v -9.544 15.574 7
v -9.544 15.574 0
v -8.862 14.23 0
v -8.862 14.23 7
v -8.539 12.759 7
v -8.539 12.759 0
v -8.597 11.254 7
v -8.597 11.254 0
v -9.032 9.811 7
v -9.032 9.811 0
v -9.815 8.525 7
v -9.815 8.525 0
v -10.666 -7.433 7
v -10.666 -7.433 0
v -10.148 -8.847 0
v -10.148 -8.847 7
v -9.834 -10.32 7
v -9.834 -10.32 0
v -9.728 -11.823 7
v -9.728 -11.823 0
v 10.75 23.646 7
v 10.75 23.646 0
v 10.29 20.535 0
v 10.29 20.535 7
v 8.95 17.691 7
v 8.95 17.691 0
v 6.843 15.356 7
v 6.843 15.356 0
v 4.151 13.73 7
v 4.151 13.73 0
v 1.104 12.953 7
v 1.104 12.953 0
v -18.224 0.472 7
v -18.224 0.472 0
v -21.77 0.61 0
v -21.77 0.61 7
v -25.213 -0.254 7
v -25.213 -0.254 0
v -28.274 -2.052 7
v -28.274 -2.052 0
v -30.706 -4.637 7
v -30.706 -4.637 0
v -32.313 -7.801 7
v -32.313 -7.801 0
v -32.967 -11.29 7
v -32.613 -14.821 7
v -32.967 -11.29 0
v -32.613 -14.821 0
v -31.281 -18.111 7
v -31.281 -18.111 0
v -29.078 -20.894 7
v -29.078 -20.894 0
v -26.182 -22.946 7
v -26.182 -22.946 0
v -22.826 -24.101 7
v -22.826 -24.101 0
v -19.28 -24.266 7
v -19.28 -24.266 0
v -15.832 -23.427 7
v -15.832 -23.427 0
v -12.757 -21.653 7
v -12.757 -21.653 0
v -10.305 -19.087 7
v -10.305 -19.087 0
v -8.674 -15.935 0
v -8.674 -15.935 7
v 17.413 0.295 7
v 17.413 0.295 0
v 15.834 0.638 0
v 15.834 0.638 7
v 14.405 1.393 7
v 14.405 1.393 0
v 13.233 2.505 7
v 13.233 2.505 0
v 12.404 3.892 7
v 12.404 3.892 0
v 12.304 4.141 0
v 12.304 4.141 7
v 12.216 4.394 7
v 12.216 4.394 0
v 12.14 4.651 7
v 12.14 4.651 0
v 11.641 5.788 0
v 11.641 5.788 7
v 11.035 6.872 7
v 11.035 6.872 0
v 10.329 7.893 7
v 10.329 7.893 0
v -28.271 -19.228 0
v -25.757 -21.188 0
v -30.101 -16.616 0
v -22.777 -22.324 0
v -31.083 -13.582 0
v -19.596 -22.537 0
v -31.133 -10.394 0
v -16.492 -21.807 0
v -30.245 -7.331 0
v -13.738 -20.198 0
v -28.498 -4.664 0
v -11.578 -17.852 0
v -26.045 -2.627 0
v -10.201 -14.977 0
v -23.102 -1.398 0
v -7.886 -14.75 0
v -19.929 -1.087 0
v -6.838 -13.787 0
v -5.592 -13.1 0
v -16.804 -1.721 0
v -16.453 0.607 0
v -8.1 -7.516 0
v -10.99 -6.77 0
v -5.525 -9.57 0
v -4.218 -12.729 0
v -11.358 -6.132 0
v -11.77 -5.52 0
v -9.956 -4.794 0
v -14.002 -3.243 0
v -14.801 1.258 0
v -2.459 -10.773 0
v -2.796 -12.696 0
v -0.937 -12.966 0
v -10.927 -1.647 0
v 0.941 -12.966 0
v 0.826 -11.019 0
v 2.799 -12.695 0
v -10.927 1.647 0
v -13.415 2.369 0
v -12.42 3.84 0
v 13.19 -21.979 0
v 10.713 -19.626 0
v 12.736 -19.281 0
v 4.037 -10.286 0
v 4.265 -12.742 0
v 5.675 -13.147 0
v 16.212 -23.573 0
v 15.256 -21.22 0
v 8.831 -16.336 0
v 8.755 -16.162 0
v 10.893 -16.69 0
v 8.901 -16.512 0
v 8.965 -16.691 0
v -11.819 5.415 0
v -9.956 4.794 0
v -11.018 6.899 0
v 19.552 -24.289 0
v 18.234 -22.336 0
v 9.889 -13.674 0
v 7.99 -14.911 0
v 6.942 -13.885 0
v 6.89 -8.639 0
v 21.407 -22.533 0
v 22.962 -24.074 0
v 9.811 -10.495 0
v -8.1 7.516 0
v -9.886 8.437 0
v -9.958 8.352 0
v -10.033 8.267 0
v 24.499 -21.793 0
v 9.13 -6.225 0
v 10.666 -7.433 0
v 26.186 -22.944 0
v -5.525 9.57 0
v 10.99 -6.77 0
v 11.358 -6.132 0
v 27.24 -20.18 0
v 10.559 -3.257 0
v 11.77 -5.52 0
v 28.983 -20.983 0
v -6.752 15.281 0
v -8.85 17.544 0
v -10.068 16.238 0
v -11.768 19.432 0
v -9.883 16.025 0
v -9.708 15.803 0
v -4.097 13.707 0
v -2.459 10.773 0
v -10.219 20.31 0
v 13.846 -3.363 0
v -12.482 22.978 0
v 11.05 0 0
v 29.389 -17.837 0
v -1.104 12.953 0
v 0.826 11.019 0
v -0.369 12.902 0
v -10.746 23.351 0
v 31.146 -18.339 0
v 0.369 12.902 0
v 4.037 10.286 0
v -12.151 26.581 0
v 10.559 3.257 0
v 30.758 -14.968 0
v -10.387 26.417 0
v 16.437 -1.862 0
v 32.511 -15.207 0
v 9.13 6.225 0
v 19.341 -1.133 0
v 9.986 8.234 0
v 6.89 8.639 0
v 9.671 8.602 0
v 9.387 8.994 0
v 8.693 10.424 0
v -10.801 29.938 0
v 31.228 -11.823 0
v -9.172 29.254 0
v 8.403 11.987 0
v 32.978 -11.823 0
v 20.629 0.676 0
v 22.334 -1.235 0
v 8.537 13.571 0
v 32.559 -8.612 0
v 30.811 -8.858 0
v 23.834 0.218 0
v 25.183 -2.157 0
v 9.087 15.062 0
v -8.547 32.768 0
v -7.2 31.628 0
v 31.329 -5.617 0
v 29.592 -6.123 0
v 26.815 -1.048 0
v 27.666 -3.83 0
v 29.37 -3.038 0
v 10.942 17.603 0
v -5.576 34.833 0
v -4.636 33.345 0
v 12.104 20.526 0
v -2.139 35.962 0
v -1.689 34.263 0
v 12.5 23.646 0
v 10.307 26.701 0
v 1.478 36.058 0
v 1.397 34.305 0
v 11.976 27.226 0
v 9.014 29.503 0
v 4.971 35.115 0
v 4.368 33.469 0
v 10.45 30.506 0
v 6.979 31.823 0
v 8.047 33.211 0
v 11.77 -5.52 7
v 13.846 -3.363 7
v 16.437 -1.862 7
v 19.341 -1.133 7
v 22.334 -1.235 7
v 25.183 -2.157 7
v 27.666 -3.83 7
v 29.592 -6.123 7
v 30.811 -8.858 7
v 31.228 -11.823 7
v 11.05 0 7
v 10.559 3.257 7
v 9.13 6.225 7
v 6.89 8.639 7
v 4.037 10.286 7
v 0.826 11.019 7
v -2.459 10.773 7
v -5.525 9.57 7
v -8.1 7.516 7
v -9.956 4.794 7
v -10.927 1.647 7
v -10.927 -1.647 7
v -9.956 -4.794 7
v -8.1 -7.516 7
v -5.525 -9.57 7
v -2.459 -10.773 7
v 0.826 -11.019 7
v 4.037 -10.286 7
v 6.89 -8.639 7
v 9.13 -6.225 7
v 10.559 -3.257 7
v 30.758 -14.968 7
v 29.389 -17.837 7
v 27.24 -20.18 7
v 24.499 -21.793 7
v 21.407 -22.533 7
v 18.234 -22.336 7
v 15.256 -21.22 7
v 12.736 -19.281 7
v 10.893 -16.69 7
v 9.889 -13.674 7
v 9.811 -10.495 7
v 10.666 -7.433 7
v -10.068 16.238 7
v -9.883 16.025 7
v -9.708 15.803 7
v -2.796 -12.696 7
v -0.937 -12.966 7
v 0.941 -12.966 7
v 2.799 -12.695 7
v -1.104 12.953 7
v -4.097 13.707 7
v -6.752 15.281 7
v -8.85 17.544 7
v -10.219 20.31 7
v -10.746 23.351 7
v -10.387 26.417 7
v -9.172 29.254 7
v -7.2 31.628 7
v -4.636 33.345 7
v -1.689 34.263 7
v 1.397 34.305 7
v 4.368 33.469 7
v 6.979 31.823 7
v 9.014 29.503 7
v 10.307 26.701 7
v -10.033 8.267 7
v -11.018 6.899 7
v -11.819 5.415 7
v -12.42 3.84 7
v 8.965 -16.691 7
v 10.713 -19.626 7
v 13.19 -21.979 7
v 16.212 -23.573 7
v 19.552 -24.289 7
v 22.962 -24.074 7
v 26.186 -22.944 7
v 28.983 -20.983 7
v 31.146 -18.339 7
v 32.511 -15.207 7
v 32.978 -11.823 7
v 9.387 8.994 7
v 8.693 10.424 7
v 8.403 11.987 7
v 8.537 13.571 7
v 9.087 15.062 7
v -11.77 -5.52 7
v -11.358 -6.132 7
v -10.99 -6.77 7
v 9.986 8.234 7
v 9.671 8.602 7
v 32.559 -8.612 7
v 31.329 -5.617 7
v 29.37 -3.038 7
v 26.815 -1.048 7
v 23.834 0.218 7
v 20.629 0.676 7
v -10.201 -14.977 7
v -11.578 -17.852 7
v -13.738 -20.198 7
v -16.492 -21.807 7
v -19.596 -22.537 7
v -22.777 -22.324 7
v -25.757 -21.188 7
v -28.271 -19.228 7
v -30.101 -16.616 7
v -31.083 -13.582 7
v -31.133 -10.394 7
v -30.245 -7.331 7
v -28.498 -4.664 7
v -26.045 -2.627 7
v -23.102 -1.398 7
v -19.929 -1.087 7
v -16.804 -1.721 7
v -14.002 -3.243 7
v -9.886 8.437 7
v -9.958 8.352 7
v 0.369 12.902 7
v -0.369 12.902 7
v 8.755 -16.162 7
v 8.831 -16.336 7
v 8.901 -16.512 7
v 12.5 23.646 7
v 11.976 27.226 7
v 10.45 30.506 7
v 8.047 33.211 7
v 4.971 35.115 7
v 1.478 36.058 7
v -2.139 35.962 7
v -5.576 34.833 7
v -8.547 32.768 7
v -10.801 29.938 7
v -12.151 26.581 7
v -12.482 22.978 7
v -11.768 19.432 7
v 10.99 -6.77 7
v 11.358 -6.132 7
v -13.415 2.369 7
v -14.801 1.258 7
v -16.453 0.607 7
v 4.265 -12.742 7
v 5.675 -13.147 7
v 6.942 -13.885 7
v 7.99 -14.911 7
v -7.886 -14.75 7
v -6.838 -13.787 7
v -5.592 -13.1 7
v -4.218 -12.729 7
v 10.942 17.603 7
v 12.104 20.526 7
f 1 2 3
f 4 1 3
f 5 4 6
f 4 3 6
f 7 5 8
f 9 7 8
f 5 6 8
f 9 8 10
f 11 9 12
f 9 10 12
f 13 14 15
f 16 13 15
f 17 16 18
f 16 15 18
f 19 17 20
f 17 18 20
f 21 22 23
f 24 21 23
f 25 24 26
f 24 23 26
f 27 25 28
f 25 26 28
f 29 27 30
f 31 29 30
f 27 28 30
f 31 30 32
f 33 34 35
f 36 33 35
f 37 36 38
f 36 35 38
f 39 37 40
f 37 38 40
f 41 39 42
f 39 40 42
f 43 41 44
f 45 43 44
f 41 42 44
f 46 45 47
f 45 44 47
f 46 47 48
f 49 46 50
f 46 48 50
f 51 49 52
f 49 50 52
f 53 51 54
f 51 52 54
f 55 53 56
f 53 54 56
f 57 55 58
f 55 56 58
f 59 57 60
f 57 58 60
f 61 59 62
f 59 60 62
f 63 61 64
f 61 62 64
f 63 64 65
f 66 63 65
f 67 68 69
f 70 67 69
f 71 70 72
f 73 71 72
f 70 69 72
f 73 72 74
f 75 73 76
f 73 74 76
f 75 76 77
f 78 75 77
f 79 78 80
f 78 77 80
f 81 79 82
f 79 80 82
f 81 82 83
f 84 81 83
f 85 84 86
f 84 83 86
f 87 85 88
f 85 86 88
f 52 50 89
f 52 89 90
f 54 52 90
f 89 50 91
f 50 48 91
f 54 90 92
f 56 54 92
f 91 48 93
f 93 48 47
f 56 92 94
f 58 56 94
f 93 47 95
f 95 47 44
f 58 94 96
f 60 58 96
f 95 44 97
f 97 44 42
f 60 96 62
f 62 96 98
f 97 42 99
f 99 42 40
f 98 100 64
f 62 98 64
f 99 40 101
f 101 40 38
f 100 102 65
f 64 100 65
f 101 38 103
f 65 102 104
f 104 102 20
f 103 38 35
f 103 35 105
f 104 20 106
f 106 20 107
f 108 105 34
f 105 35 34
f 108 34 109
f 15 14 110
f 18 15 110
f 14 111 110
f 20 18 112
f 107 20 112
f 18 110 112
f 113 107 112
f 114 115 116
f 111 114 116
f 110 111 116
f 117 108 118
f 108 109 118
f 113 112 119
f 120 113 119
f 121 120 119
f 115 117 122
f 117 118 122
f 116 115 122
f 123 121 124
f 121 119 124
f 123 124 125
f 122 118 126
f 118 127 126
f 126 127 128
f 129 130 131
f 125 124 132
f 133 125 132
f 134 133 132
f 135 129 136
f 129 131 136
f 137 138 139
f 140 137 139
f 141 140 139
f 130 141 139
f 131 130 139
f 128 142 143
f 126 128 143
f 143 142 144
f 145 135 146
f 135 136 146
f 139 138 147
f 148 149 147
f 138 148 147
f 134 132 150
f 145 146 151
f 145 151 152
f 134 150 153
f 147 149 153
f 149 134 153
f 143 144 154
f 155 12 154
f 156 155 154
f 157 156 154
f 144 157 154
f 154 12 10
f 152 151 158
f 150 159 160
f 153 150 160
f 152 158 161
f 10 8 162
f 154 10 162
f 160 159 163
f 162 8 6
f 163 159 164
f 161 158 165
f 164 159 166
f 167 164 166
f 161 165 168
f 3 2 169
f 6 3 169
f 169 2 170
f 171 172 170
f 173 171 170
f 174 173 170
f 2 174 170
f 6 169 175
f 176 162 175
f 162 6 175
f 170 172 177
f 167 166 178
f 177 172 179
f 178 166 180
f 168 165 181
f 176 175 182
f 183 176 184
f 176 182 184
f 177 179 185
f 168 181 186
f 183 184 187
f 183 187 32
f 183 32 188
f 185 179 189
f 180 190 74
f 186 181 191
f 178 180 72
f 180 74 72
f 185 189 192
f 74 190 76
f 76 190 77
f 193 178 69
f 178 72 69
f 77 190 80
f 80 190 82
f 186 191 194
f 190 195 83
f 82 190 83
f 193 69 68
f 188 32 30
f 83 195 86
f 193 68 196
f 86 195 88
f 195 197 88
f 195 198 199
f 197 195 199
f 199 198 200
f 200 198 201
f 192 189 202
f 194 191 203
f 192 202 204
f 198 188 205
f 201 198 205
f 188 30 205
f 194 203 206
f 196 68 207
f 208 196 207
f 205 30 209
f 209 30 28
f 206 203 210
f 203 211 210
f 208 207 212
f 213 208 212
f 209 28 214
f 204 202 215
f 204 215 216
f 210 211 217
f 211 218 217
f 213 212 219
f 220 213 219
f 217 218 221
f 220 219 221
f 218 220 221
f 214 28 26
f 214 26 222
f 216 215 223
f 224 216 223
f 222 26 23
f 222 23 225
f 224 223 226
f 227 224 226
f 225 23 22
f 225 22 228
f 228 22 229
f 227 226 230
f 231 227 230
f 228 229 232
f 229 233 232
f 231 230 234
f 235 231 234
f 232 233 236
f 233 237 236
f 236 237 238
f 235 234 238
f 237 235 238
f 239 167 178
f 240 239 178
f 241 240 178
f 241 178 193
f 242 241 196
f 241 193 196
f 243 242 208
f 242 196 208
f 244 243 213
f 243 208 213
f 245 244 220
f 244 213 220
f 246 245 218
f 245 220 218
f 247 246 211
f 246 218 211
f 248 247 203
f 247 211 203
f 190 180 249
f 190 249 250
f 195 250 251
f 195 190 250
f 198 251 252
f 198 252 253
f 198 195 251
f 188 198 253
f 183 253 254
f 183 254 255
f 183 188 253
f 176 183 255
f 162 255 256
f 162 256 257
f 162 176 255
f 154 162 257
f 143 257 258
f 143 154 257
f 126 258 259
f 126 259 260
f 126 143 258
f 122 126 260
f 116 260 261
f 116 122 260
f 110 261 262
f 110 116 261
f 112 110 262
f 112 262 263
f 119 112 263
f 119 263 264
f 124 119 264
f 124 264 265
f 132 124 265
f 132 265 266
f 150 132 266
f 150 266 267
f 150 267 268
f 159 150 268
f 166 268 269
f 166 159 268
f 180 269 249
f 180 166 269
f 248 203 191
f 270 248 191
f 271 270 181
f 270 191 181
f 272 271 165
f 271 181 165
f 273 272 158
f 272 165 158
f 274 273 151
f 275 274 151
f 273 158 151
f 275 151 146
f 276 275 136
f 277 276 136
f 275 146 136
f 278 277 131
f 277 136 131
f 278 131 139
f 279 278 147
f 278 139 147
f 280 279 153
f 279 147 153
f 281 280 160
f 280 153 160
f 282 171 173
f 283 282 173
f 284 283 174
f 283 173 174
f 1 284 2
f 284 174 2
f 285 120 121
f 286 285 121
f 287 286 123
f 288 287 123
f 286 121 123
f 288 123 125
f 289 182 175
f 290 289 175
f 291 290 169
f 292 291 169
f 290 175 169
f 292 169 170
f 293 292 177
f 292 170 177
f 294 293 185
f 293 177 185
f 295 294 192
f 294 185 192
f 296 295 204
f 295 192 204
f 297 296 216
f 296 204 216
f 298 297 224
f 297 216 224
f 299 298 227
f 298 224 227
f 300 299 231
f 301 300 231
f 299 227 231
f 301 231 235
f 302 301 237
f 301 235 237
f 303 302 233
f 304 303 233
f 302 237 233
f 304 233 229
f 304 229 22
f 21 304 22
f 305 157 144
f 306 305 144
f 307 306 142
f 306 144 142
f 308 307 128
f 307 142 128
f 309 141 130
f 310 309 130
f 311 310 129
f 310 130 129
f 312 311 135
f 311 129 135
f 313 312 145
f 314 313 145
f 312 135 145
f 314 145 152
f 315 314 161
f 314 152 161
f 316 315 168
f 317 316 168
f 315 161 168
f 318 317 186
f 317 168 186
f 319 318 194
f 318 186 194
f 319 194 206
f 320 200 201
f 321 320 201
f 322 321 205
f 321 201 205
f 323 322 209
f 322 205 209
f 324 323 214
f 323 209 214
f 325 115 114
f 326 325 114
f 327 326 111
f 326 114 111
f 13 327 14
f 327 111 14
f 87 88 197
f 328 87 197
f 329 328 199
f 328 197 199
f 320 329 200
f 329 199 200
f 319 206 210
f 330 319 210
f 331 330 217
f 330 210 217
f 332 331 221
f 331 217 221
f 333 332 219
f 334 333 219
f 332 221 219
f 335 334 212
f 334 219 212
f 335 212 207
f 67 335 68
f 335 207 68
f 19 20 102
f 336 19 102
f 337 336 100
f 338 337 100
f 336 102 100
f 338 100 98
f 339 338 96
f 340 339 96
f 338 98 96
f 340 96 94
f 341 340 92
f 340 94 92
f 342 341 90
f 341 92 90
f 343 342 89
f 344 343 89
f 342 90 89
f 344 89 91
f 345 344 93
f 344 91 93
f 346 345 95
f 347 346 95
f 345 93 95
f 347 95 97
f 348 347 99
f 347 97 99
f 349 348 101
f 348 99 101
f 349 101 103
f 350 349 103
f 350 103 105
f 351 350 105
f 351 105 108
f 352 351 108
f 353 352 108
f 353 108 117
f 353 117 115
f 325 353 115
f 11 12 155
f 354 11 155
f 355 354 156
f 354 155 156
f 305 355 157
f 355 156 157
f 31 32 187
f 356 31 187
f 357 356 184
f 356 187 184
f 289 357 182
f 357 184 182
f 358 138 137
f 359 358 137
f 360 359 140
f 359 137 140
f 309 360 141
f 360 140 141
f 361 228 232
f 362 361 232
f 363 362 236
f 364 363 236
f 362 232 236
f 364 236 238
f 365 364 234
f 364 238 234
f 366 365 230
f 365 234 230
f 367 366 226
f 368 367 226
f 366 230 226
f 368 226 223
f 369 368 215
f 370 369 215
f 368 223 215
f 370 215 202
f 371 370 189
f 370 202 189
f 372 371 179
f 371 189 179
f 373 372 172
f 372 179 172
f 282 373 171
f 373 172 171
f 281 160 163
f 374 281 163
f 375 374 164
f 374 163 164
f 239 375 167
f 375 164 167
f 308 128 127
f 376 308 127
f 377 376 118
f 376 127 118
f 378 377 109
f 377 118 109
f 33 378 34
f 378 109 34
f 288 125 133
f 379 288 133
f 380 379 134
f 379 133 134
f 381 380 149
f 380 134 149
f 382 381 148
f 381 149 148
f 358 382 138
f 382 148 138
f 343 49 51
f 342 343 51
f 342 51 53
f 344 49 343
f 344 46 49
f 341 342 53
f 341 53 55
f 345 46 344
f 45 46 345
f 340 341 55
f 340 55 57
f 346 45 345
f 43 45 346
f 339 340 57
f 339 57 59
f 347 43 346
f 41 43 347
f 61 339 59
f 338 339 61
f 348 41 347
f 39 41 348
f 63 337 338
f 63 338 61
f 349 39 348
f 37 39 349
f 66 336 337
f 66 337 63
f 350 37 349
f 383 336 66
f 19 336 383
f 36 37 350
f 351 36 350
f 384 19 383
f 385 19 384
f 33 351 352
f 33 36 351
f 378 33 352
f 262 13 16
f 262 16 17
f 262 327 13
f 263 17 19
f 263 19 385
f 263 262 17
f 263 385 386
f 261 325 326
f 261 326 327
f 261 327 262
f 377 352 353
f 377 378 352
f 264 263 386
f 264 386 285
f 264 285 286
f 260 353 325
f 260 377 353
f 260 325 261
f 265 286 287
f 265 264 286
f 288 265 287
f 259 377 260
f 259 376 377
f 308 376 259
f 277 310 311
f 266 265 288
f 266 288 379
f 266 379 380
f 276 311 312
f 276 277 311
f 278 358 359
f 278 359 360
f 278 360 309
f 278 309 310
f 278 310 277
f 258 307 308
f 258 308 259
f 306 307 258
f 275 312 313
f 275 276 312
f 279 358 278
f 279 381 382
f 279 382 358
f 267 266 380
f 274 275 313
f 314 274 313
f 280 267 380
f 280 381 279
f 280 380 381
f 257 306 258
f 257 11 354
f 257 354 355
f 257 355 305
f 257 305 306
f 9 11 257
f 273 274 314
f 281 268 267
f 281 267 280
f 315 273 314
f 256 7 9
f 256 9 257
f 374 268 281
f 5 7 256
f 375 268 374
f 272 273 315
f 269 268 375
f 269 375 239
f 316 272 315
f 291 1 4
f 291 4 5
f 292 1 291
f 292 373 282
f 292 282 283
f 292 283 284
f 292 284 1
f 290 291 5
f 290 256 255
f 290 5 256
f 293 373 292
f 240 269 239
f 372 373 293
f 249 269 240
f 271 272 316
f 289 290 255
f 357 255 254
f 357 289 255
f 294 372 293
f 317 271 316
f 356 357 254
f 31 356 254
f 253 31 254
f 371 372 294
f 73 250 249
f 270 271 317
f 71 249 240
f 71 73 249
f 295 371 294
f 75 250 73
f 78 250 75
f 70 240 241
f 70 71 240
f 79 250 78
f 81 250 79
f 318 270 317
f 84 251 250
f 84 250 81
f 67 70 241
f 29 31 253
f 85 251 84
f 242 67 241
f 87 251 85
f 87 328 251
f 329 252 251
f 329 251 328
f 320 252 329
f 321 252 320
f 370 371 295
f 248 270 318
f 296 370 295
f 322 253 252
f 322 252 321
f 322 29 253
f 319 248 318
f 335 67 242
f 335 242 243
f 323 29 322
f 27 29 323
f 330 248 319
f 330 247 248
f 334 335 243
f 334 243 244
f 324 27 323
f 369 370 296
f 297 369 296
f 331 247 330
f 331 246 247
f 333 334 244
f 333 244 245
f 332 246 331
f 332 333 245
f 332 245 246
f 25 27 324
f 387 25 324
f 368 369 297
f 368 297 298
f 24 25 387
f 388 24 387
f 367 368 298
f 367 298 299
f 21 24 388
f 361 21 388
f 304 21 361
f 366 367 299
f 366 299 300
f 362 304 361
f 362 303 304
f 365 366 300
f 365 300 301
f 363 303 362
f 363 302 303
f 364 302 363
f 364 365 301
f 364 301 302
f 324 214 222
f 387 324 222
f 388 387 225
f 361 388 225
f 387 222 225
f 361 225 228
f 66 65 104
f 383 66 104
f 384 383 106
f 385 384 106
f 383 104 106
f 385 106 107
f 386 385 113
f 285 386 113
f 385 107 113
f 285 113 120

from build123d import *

# Parameters (mm, degrees)
F0_R     = 11.05
F1_DEPTH = 7


with BuildPart() as f1:
    # F0 (on Top) → F1 (new body)
    with BuildSketch(Plane.XY):
        with BuildLine():
            ThreePointArc((12.4036553845, 3.8922144215), (12.2588680886, 4.2668950825), (12.1397217876, 4.650500502))
            ThreePointArc((12.1397217876, 4.650500502), (11.3509584551, 6.3368558568), (10.3294036233, 7.8932515979))
            ThreePointArc((10.3294036233, 7.8932515979), (9.8245761866, 8.414561478), (9.3870501636, 8.9935137308))
            ThreePointArc((9.3870501636, 8.9935137308), (7.2468764963, 10.7927188904), (4.7714819389, 12.092682089))
            ThreePointArc((4.7714819389, 12.092682089), (0, 11.1461646855), (-4.7714819389, 12.092682089))
            ThreePointArc((-4.7714819389, 12.092682089), (-7.5081755961, 10.6126009639), (-9.8148092936, 8.5246418417))
            ThreePointArc((-9.8148092936, 8.5246418417), (-9.9218729104, 8.3943935706), (-10.0325882839, 8.2672348658))
            ThreePointArc((-10.0325882839, 8.2672348658), (-11.4424495934, 6.1701172844), (-12.419961597, 3.8398637906))
            ThreePointArc((-12.419961597, 3.8398637906), (-12.9624394617, 0.9875035204), (-12.8583108585, -1.9141164717))
            ThreePointArc((-12.8583108585, -1.9141164717), (-9.6528617724, -5.5730823427), (-8.0868289195, -10.1785656173))
            ThreePointArc((-8.0868289195, -10.1785656173), (-5.5850066858, -11.7391524532), (-2.7958525219, -12.695794921))
            ThreePointArc((-2.7958525219, -12.695794921), (0.0017952144, -12.999999876), (2.7993588265, -12.6950222592))
            ThreePointArc((2.7993588265, -12.6950222592), (5.5866277322, -11.7383810886), (8.0868289195, -10.1785656173))
            ThreePointArc((8.0868289195, -10.1785656173), (9.6528617724, -5.5730823427), (12.8583108585, -1.9141164717))
            ThreePointArc((12.8583108585, -1.9141164717), (12.9645293235, -0.9596767268), (13, 0))
            ThreePointArc((13, 0), (12.8500490271, 1.9688169038), (12.4036553845, 3.8922144215))
        make_face()
        Circle(F0_R, mode=Mode.SUBTRACT)
        with BuildLine():
            ThreePointArc((17.4129621968, 0.2952691949), (14.4052350934, 1.3931332806), (12.4036553845, 3.8922144215))
            ThreePointArc((12.4036553845, 3.8922144215), (12.8500490271, 1.9688169038), (13, 0))
            ThreePointArc((13, 0), (12.9645293235, -0.9596767268), (12.8583108585, -1.9141164717))
            ThreePointArc((12.8583108585, -1.9141164717), (15.0226216268, -0.5764432777), (17.4129621968, 0.2952691949))
        make_face()
        with BuildLine():
            ThreePointArc((4.7714819389, 12.092682089), (7.2468764963, 10.7927188904), (9.3870501636, 8.9935137308))
            ThreePointArc((9.3870501636, 8.9935137308), (8.402604273, 11.9865844679), (9.0866097244, 15.0622539383))
            ThreePointArc((9.0866097244, 15.0622539383), (7.0863435832, 13.3488963768), (4.7714819389, 12.092682089))
        make_face()
        with BuildLine():
            ThreePointArc((32.9781793197, -11.8230823427), (28.1572022381, -1.9598877782), (17.4129621968, 0.2952691949))
            ThreePointArc((17.4129621968, 0.2952691949), (15.0226216268, -0.5764432777), (12.8583108585, -1.9141164717))
            ThreePointArc((12.8583108585, -1.9141164717), (12.4453302152, -3.7568278952), (11.7697355483, -5.5202649505))
            ThreePointArc((11.7697355483, -5.5202649505), (23.7907862581, -1.5961993733), (31.2281793197, -11.8230823427))
            ThreePointArc((31.2281793197, -11.8230823427), (18.2335395964, -22.3361262651), (10.6655574569, -7.4327575054))
            ThreePointArc((10.6655574569, -7.4327575054), (9.4761735025, -8.8995581772), (8.0868289195, -10.1785656173))
            ThreePointArc((8.0868289195, -10.1785656173), (8.05547786, -13.2110623297), (8.7553384731, -16.161861259))
            ThreePointArc((8.7553384731, -16.161861259), (8.8665325035, -16.4239751001), (8.9650446915, -16.6911138785))
            ThreePointArc((8.9650446915, -16.6911138785), (22.9617067654, -24.0738819667), (32.9781793197, -11.8230823427))
        make_face()
        with BuildLine():
            ThreePointArc((-4.7714819389, 12.092682089), (0, 11.1461646855), (4.7714819389, 12.092682089))
            ThreePointArc((4.7714819389, 12.092682089), (2.9691567127, 12.6563860725), (1.1041780914, 12.9530224559))
            ThreePointArc((1.1041780914, 12.9530224559), (0, 12.8961646855), (-1.1041780914, 12.9530224559))
            ThreePointArc((-1.1041780914, 12.9530224559), (-2.9691567127, 12.6563860725), (-4.7714819389, 12.092682089))
        make_face()
        with BuildLine():
            ThreePointArc((1.1041780914, 12.9530224559), (2.9691567127, 12.6563860725), (4.7714819389, 12.092682089))
            ThreePointArc((4.7714819389, 12.092682089), (7.0863435832, 13.3488963768), (9.0866097244, 15.0622539383))
            ThreePointArc((9.0866097244, 15.0622539383), (11.6153480696, 19.027324006), (12.5, 23.6461646855))
            ThreePointArc((12.5, 23.6461646855), (-3.8986180344, 35.5226446952), (-10.0681243875, 16.2378672213))
            ThreePointArc((-10.0681243875, 16.2378672213), (-9.794102473, 15.9150690623), (-9.5437602938, 15.5735790121))
            ThreePointArc((-9.5437602938, 15.5735790121), (-7.3661863194, 13.5471895341), (-4.7714819389, 12.092682089))
            ThreePointArc((-4.7714819389, 12.092682089), (-2.9691567127, 12.6563860725), (-1.1041780914, 12.9530224559))
            ThreePointArc((-1.1041780914, 12.9530224559), (-7.2004369839, 31.6284079317), (10.75, 23.6461646855))
            ThreePointArc((10.75, 23.6461646855), (7.9822432462, 16.4457277016), (1.1041780914, 12.9530224559))
        make_face()
        with BuildLine():
            ThreePointArc((11.7697355483, -5.5202649505), (12.4453302152, -3.7568278952), (12.8583108585, -1.9141164717))
            ThreePointArc((12.8583108585, -1.9141164717), (9.6528617724, -5.5730823427), (8.0868289195, -10.1785656173))
            ThreePointArc((8.0868289195, -10.1785656173), (9.4761735025, -8.8995581772), (10.6655574569, -7.4327575054))
            ThreePointArc((10.6655574569, -7.4327575054), (11.168406229, -6.4480823427), (11.7697355483, -5.5202649505))
        make_face()
        with BuildLine():
            ThreePointArc((-9.8148092936, 8.5246418417), (-7.5081755961, 10.6126009639), (-4.7714819389, 12.092682089))
            ThreePointArc((-4.7714819389, 12.092682089), (-7.3661863194, 13.5471895341), (-9.5437602938, 15.5735790121))
            ThreePointArc((-9.5437602938, 15.5735790121), (-8.5203205537, 12.0045453967), (-9.8148092936, 8.5246418417))
        make_face()
        with BuildLine():
            ThreePointArc((8.7553384731, -16.161861259), (8.05547786, -13.2110623297), (8.0868289195, -10.1785656173))
            ThreePointArc((8.0868289195, -10.1785656173), (5.5866277322, -11.7383810886), (2.7993588265, -12.6950222592))
            ThreePointArc((2.7993588265, -12.6950222592), (6.3311702253, -13.4769842407), (8.7553384731, -16.161861259))
        make_face()
        with BuildLine():
            ThreePointArc((-8.6738467532, -15.9349836863), (-6.2358648809, -13.4062219399), (-2.7958525219, -12.695794921))
            ThreePointArc((-2.7958525219, -12.695794921), (-5.5850066858, -11.7391524532), (-8.0868289195, -10.1785656173))
            ThreePointArc((-8.0868289195, -10.1785656173), (-8.0053712958, -10.9990313741), (-7.9781793197, -11.8230823427))
            ThreePointArc((-7.9781793197, -11.8230823427), (-8.1533231931, -13.9082493527), (-8.6738467532, -15.9349836863))
        make_face()
        with BuildLine():
            ThreePointArc((-12.8583108585, -1.9141164717), (-12.9624394617, 0.9875035204), (-12.419961597, 3.8398637906))
            ThreePointArc((-12.419961597, 3.8398637906), (-14.8010494837, 1.2584054136), (-18.2237650289, 0.4719416997))
            ThreePointArc((-18.2237650289, 0.4719416997), (-15.3989388877, -0.4015536958), (-12.8583108585, -1.9141164717))
        make_face()
        with BuildLine():
            ThreePointArc((-7.9781793197, -11.8230823427), (-8.0053712958, -10.9990313741), (-8.0868289195, -10.1785656173))
            ThreePointArc((-8.0868289195, -10.1785656173), (-9.4761735025, -8.8995581772), (-10.6655574569, -7.4327575054))
            ThreePointArc((-10.6655574569, -7.4327575054), (-9.9651353974, -9.5784426194), (-9.7281793197, -11.8230823427))
            ThreePointArc((-9.7281793197, -11.8230823427), (-30.7050622892, -15.1356892812), (-11.7697355483, -5.5202649505))
            ThreePointArc((-11.7697355483, -5.5202649505), (-12.4453302152, -3.7568278952), (-12.8583108585, -1.9141164717))
            ThreePointArc((-12.8583108585, -1.9141164717), (-15.3989388877, -0.4015536958), (-18.2237650289, 0.4719416997))
            ThreePointArc((-18.2237650289, 0.4719416997), (-31.281368245, -18.1112544972), (-8.6738467532, -15.9349836863))
            ThreePointArc((-8.6738467532, -15.9349836863), (-8.1533231931, -13.9082493527), (-7.9781793197, -11.8230823427))
        make_face()
        with BuildLine():
            ThreePointArc((-10.6655574569, -7.4327575054), (-9.4761735025, -8.8995581772), (-8.0868289195, -10.1785656173))
            ThreePointArc((-8.0868289195, -10.1785656173), (-9.6528617724, -5.5730823427), (-12.8583108585, -1.9141164717))
            ThreePointArc((-12.8583108585, -1.9141164717), (-12.4453302152, -3.7568278952), (-11.7697355483, -5.5202649505))
            ThreePointArc((-11.7697355483, -5.5202649505), (-11.168406229, -6.4480823427), (-10.6655574569, -7.4327575054))
        make_face()
    extrude(amount=F1_DEPTH)


solid = f1.part
